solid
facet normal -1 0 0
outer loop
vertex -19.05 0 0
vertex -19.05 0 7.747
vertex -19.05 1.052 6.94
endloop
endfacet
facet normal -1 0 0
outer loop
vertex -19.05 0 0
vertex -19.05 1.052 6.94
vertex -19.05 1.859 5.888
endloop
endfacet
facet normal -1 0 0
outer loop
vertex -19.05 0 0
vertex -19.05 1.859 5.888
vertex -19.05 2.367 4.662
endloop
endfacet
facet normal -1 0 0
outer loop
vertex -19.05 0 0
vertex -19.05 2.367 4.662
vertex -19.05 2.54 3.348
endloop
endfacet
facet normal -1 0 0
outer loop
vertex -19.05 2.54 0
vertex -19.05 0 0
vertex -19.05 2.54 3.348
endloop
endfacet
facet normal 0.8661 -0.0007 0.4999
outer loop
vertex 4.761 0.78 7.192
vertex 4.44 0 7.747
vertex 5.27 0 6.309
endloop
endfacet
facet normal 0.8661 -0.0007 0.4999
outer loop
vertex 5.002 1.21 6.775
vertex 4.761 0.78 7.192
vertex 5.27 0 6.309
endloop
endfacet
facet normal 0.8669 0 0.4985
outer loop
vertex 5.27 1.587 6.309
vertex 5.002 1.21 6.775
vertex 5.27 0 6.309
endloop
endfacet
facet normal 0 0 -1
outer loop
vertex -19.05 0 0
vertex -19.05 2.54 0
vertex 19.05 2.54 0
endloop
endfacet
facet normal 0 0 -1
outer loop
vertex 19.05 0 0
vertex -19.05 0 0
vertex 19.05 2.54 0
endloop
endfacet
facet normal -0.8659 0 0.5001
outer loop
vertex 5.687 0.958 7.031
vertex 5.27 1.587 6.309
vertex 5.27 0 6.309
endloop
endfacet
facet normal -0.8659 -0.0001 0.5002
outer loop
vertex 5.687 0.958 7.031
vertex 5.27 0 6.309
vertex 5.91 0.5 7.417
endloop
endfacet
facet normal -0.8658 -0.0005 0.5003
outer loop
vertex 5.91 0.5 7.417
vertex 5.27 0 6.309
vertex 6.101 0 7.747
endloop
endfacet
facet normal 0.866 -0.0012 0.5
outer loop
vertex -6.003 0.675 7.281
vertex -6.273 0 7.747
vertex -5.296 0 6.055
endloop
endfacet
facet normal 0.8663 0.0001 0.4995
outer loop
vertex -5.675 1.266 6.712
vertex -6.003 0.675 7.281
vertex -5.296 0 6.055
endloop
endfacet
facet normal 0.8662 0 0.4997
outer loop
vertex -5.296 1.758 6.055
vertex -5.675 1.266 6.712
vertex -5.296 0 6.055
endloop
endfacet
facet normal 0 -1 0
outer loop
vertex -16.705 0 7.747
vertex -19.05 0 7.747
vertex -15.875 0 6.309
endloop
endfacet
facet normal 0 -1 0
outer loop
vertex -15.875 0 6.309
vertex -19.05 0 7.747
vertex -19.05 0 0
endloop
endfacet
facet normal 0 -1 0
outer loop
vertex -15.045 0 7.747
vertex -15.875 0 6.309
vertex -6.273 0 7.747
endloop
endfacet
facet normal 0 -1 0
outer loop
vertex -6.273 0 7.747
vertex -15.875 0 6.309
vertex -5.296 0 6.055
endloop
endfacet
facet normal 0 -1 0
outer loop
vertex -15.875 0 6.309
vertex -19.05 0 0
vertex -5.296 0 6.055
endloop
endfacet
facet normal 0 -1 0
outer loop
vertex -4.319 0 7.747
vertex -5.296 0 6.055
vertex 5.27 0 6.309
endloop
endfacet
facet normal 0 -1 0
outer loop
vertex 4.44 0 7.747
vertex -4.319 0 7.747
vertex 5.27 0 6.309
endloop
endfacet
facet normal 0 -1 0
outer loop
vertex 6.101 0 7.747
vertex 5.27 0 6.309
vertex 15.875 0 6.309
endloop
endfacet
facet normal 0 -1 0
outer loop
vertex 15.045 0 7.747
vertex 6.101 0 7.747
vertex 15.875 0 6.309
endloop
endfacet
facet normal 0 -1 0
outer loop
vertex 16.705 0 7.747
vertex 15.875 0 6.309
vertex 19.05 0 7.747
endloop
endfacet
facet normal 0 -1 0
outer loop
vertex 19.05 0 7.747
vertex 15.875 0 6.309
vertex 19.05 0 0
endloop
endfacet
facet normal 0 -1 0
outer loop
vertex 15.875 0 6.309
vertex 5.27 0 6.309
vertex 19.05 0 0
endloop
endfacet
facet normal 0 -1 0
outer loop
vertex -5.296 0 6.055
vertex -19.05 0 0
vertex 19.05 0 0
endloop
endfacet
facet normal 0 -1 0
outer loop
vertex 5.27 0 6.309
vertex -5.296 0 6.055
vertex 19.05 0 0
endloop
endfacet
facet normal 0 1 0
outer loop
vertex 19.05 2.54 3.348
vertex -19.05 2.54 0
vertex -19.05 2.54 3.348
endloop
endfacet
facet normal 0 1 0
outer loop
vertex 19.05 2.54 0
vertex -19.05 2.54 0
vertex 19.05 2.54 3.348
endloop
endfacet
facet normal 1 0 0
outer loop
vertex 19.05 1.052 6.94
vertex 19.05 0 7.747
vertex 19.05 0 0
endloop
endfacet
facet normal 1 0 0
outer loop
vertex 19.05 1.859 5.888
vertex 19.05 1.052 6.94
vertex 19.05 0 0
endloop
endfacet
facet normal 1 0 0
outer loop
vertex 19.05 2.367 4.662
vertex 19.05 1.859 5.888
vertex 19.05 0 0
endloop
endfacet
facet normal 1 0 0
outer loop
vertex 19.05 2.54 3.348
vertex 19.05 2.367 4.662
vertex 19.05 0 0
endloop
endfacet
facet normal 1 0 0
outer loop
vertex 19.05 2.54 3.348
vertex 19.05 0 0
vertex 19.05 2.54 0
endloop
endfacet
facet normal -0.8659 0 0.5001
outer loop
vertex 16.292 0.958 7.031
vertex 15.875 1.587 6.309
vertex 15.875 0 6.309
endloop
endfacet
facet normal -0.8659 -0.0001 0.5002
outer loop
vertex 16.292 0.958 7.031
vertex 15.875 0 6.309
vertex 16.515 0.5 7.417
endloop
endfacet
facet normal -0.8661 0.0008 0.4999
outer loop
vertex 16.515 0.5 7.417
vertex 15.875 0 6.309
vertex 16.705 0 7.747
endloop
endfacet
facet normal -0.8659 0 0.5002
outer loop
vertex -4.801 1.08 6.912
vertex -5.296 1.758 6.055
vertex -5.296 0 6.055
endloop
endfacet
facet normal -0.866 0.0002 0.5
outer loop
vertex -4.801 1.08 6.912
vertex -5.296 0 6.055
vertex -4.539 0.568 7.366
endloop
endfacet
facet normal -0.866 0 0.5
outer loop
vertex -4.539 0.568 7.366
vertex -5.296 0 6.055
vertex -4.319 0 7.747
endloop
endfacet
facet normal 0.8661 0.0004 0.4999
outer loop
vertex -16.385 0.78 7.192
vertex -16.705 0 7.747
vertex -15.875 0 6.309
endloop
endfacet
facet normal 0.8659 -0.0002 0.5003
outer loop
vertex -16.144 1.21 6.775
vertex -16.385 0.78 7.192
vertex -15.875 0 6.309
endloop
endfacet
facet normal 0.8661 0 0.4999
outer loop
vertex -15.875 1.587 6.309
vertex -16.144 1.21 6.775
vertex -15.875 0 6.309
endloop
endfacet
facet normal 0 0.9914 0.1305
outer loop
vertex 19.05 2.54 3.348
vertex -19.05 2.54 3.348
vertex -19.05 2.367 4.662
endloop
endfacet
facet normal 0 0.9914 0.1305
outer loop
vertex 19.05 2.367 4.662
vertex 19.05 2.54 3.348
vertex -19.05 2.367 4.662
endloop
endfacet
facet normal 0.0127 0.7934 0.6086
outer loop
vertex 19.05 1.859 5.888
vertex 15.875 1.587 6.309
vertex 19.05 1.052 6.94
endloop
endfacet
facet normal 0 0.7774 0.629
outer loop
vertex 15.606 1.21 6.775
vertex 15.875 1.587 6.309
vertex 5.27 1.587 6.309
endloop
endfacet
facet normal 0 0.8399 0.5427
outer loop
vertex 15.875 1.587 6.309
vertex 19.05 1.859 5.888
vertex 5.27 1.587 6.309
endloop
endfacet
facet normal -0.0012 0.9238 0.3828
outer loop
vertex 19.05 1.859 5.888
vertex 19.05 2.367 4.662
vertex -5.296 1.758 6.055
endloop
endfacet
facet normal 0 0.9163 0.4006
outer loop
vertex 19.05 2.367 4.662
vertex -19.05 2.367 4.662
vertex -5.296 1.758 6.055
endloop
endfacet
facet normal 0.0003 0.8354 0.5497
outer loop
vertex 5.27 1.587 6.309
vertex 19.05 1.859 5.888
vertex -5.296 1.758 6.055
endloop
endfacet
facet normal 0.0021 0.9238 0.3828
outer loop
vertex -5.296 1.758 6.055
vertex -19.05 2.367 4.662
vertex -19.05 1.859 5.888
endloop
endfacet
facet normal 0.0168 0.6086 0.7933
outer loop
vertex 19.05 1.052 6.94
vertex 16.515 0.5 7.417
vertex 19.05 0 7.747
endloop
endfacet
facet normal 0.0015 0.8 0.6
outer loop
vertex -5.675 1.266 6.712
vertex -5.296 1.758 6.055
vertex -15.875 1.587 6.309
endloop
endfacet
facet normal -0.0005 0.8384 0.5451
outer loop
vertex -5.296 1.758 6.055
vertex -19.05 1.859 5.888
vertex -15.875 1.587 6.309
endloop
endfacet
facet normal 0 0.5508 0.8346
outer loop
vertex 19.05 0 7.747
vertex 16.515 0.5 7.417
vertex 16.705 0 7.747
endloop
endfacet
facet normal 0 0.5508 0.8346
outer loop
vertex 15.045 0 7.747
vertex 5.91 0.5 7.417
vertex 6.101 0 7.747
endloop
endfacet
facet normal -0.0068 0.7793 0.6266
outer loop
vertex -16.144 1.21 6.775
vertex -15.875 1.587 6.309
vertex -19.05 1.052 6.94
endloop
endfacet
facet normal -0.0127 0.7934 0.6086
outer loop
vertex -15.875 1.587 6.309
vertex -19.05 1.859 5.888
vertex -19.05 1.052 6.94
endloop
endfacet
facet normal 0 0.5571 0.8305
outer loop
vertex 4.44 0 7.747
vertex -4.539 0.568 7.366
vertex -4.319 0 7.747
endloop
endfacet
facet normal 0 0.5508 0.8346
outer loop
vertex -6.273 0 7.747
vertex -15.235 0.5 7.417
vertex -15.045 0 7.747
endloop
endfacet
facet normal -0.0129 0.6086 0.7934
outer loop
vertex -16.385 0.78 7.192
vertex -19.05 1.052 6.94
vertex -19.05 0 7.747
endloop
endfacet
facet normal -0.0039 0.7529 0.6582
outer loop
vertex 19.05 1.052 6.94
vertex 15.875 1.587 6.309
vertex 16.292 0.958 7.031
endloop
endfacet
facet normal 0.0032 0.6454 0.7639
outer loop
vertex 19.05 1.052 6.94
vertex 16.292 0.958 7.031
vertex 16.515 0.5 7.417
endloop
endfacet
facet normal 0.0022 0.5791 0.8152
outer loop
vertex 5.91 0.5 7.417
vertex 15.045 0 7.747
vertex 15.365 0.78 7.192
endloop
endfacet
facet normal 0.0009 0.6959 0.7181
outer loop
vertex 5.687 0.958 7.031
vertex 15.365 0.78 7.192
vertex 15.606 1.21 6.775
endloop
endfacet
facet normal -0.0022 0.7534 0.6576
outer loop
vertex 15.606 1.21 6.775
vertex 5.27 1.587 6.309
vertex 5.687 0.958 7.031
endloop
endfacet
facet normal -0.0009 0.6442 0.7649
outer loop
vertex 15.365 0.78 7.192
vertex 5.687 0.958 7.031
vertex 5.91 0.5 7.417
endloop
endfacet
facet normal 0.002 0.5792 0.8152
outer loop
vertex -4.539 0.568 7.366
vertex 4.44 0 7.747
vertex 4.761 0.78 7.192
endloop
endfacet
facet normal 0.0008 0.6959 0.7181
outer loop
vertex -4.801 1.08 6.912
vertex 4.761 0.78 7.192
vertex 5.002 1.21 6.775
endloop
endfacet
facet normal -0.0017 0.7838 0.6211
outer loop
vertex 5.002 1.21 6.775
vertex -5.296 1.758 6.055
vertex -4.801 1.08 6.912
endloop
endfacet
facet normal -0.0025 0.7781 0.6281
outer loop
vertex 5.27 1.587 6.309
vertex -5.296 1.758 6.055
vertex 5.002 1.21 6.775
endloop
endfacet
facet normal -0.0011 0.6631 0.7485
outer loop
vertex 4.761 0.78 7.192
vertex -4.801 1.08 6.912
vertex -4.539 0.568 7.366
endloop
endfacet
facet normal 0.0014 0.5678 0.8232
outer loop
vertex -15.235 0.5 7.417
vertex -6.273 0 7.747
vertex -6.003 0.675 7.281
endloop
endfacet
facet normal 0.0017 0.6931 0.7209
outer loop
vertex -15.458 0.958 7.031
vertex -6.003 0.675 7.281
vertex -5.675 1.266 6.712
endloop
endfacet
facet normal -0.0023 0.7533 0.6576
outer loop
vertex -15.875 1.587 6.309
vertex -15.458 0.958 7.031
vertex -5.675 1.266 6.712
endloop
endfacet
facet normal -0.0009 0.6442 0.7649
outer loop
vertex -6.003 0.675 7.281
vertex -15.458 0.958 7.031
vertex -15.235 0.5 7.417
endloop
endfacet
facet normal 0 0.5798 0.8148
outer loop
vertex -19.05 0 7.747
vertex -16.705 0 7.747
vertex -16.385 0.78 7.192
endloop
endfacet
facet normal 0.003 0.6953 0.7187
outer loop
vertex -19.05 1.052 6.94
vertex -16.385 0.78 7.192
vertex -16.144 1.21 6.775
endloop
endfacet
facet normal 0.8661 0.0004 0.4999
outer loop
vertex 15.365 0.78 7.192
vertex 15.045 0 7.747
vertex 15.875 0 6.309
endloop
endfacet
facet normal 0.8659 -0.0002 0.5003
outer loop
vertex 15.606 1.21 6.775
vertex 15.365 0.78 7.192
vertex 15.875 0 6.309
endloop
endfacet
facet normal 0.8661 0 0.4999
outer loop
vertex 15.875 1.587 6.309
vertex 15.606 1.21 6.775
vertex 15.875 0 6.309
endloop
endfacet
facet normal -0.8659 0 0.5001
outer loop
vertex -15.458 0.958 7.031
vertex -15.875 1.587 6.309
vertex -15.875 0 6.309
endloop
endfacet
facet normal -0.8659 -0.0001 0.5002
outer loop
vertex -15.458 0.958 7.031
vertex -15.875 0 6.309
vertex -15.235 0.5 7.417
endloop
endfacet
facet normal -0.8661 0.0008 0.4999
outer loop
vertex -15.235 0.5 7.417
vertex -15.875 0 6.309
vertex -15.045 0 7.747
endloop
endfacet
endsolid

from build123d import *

# Parameters (mm, degrees)
F0_W        = 38.1
F0_H        = 2.54
F1_DEPTH    = 7.747
F3_T1_DEPTH = 60.0970452561
F4_DEPTH    = 25.4


# Not quite as in the source:
# - a fillet or chamfer that OpenCascade refuses, or shapes differently, is made with other operations: its cross-section is extruded or revolved along the edge and cut away or added


with BuildPart() as f1:
    # F0 (on Top) → F1 (new body)
    with BuildSketch(Plane.XY):
        with Locations((0, 1.27)):
            Rectangle(F0_W, F0_H)
    extrude(amount=F1_DEPTH)

    # F3: fillet of radius 5.08 on 1 edges, made by hand

    # F3_s2 → F3_t1 (cut)
    with BuildSketch(Plane.YZ.offset(-30.0485226281)):
        with BuildLine():
            ThreePointArc((2.54, 3.3475909488), (1.8594090512, 5.8875909488), (0, 7.747))
            Line((0, 7.747), (2.54, 7.747))
            Line((2.54, 7.747), (2.54, 3.3475909488))
        make_face()
    extrude(amount=F3_T1_DEPTH, mode=Mode.SUBTRACT)

    # F2 (on face) → F4 (cut)
    with BuildSketch(Plane.XZ):
        Polygon((-15.875, 6.3092954744), (-15.0449409051, 7.747), (-16.7050590949, 7.747), align=None)
        Polygon((-4.3191939367, 7.747), (-6.2726060633, 7.747), (-5.2959, 6.0552954744), align=None)
        Polygon((6.1005590949, 7.747), (4.4404409051, 7.747), (5.2705, 6.3092954744), align=None)
        Polygon((16.7050590949, 7.747), (15.0449409051, 7.747), (15.875, 6.3092954744), align=None)
    extrude(amount=-F4_DEPTH, mode=Mode.SUBTRACT)


solid = f1.part
